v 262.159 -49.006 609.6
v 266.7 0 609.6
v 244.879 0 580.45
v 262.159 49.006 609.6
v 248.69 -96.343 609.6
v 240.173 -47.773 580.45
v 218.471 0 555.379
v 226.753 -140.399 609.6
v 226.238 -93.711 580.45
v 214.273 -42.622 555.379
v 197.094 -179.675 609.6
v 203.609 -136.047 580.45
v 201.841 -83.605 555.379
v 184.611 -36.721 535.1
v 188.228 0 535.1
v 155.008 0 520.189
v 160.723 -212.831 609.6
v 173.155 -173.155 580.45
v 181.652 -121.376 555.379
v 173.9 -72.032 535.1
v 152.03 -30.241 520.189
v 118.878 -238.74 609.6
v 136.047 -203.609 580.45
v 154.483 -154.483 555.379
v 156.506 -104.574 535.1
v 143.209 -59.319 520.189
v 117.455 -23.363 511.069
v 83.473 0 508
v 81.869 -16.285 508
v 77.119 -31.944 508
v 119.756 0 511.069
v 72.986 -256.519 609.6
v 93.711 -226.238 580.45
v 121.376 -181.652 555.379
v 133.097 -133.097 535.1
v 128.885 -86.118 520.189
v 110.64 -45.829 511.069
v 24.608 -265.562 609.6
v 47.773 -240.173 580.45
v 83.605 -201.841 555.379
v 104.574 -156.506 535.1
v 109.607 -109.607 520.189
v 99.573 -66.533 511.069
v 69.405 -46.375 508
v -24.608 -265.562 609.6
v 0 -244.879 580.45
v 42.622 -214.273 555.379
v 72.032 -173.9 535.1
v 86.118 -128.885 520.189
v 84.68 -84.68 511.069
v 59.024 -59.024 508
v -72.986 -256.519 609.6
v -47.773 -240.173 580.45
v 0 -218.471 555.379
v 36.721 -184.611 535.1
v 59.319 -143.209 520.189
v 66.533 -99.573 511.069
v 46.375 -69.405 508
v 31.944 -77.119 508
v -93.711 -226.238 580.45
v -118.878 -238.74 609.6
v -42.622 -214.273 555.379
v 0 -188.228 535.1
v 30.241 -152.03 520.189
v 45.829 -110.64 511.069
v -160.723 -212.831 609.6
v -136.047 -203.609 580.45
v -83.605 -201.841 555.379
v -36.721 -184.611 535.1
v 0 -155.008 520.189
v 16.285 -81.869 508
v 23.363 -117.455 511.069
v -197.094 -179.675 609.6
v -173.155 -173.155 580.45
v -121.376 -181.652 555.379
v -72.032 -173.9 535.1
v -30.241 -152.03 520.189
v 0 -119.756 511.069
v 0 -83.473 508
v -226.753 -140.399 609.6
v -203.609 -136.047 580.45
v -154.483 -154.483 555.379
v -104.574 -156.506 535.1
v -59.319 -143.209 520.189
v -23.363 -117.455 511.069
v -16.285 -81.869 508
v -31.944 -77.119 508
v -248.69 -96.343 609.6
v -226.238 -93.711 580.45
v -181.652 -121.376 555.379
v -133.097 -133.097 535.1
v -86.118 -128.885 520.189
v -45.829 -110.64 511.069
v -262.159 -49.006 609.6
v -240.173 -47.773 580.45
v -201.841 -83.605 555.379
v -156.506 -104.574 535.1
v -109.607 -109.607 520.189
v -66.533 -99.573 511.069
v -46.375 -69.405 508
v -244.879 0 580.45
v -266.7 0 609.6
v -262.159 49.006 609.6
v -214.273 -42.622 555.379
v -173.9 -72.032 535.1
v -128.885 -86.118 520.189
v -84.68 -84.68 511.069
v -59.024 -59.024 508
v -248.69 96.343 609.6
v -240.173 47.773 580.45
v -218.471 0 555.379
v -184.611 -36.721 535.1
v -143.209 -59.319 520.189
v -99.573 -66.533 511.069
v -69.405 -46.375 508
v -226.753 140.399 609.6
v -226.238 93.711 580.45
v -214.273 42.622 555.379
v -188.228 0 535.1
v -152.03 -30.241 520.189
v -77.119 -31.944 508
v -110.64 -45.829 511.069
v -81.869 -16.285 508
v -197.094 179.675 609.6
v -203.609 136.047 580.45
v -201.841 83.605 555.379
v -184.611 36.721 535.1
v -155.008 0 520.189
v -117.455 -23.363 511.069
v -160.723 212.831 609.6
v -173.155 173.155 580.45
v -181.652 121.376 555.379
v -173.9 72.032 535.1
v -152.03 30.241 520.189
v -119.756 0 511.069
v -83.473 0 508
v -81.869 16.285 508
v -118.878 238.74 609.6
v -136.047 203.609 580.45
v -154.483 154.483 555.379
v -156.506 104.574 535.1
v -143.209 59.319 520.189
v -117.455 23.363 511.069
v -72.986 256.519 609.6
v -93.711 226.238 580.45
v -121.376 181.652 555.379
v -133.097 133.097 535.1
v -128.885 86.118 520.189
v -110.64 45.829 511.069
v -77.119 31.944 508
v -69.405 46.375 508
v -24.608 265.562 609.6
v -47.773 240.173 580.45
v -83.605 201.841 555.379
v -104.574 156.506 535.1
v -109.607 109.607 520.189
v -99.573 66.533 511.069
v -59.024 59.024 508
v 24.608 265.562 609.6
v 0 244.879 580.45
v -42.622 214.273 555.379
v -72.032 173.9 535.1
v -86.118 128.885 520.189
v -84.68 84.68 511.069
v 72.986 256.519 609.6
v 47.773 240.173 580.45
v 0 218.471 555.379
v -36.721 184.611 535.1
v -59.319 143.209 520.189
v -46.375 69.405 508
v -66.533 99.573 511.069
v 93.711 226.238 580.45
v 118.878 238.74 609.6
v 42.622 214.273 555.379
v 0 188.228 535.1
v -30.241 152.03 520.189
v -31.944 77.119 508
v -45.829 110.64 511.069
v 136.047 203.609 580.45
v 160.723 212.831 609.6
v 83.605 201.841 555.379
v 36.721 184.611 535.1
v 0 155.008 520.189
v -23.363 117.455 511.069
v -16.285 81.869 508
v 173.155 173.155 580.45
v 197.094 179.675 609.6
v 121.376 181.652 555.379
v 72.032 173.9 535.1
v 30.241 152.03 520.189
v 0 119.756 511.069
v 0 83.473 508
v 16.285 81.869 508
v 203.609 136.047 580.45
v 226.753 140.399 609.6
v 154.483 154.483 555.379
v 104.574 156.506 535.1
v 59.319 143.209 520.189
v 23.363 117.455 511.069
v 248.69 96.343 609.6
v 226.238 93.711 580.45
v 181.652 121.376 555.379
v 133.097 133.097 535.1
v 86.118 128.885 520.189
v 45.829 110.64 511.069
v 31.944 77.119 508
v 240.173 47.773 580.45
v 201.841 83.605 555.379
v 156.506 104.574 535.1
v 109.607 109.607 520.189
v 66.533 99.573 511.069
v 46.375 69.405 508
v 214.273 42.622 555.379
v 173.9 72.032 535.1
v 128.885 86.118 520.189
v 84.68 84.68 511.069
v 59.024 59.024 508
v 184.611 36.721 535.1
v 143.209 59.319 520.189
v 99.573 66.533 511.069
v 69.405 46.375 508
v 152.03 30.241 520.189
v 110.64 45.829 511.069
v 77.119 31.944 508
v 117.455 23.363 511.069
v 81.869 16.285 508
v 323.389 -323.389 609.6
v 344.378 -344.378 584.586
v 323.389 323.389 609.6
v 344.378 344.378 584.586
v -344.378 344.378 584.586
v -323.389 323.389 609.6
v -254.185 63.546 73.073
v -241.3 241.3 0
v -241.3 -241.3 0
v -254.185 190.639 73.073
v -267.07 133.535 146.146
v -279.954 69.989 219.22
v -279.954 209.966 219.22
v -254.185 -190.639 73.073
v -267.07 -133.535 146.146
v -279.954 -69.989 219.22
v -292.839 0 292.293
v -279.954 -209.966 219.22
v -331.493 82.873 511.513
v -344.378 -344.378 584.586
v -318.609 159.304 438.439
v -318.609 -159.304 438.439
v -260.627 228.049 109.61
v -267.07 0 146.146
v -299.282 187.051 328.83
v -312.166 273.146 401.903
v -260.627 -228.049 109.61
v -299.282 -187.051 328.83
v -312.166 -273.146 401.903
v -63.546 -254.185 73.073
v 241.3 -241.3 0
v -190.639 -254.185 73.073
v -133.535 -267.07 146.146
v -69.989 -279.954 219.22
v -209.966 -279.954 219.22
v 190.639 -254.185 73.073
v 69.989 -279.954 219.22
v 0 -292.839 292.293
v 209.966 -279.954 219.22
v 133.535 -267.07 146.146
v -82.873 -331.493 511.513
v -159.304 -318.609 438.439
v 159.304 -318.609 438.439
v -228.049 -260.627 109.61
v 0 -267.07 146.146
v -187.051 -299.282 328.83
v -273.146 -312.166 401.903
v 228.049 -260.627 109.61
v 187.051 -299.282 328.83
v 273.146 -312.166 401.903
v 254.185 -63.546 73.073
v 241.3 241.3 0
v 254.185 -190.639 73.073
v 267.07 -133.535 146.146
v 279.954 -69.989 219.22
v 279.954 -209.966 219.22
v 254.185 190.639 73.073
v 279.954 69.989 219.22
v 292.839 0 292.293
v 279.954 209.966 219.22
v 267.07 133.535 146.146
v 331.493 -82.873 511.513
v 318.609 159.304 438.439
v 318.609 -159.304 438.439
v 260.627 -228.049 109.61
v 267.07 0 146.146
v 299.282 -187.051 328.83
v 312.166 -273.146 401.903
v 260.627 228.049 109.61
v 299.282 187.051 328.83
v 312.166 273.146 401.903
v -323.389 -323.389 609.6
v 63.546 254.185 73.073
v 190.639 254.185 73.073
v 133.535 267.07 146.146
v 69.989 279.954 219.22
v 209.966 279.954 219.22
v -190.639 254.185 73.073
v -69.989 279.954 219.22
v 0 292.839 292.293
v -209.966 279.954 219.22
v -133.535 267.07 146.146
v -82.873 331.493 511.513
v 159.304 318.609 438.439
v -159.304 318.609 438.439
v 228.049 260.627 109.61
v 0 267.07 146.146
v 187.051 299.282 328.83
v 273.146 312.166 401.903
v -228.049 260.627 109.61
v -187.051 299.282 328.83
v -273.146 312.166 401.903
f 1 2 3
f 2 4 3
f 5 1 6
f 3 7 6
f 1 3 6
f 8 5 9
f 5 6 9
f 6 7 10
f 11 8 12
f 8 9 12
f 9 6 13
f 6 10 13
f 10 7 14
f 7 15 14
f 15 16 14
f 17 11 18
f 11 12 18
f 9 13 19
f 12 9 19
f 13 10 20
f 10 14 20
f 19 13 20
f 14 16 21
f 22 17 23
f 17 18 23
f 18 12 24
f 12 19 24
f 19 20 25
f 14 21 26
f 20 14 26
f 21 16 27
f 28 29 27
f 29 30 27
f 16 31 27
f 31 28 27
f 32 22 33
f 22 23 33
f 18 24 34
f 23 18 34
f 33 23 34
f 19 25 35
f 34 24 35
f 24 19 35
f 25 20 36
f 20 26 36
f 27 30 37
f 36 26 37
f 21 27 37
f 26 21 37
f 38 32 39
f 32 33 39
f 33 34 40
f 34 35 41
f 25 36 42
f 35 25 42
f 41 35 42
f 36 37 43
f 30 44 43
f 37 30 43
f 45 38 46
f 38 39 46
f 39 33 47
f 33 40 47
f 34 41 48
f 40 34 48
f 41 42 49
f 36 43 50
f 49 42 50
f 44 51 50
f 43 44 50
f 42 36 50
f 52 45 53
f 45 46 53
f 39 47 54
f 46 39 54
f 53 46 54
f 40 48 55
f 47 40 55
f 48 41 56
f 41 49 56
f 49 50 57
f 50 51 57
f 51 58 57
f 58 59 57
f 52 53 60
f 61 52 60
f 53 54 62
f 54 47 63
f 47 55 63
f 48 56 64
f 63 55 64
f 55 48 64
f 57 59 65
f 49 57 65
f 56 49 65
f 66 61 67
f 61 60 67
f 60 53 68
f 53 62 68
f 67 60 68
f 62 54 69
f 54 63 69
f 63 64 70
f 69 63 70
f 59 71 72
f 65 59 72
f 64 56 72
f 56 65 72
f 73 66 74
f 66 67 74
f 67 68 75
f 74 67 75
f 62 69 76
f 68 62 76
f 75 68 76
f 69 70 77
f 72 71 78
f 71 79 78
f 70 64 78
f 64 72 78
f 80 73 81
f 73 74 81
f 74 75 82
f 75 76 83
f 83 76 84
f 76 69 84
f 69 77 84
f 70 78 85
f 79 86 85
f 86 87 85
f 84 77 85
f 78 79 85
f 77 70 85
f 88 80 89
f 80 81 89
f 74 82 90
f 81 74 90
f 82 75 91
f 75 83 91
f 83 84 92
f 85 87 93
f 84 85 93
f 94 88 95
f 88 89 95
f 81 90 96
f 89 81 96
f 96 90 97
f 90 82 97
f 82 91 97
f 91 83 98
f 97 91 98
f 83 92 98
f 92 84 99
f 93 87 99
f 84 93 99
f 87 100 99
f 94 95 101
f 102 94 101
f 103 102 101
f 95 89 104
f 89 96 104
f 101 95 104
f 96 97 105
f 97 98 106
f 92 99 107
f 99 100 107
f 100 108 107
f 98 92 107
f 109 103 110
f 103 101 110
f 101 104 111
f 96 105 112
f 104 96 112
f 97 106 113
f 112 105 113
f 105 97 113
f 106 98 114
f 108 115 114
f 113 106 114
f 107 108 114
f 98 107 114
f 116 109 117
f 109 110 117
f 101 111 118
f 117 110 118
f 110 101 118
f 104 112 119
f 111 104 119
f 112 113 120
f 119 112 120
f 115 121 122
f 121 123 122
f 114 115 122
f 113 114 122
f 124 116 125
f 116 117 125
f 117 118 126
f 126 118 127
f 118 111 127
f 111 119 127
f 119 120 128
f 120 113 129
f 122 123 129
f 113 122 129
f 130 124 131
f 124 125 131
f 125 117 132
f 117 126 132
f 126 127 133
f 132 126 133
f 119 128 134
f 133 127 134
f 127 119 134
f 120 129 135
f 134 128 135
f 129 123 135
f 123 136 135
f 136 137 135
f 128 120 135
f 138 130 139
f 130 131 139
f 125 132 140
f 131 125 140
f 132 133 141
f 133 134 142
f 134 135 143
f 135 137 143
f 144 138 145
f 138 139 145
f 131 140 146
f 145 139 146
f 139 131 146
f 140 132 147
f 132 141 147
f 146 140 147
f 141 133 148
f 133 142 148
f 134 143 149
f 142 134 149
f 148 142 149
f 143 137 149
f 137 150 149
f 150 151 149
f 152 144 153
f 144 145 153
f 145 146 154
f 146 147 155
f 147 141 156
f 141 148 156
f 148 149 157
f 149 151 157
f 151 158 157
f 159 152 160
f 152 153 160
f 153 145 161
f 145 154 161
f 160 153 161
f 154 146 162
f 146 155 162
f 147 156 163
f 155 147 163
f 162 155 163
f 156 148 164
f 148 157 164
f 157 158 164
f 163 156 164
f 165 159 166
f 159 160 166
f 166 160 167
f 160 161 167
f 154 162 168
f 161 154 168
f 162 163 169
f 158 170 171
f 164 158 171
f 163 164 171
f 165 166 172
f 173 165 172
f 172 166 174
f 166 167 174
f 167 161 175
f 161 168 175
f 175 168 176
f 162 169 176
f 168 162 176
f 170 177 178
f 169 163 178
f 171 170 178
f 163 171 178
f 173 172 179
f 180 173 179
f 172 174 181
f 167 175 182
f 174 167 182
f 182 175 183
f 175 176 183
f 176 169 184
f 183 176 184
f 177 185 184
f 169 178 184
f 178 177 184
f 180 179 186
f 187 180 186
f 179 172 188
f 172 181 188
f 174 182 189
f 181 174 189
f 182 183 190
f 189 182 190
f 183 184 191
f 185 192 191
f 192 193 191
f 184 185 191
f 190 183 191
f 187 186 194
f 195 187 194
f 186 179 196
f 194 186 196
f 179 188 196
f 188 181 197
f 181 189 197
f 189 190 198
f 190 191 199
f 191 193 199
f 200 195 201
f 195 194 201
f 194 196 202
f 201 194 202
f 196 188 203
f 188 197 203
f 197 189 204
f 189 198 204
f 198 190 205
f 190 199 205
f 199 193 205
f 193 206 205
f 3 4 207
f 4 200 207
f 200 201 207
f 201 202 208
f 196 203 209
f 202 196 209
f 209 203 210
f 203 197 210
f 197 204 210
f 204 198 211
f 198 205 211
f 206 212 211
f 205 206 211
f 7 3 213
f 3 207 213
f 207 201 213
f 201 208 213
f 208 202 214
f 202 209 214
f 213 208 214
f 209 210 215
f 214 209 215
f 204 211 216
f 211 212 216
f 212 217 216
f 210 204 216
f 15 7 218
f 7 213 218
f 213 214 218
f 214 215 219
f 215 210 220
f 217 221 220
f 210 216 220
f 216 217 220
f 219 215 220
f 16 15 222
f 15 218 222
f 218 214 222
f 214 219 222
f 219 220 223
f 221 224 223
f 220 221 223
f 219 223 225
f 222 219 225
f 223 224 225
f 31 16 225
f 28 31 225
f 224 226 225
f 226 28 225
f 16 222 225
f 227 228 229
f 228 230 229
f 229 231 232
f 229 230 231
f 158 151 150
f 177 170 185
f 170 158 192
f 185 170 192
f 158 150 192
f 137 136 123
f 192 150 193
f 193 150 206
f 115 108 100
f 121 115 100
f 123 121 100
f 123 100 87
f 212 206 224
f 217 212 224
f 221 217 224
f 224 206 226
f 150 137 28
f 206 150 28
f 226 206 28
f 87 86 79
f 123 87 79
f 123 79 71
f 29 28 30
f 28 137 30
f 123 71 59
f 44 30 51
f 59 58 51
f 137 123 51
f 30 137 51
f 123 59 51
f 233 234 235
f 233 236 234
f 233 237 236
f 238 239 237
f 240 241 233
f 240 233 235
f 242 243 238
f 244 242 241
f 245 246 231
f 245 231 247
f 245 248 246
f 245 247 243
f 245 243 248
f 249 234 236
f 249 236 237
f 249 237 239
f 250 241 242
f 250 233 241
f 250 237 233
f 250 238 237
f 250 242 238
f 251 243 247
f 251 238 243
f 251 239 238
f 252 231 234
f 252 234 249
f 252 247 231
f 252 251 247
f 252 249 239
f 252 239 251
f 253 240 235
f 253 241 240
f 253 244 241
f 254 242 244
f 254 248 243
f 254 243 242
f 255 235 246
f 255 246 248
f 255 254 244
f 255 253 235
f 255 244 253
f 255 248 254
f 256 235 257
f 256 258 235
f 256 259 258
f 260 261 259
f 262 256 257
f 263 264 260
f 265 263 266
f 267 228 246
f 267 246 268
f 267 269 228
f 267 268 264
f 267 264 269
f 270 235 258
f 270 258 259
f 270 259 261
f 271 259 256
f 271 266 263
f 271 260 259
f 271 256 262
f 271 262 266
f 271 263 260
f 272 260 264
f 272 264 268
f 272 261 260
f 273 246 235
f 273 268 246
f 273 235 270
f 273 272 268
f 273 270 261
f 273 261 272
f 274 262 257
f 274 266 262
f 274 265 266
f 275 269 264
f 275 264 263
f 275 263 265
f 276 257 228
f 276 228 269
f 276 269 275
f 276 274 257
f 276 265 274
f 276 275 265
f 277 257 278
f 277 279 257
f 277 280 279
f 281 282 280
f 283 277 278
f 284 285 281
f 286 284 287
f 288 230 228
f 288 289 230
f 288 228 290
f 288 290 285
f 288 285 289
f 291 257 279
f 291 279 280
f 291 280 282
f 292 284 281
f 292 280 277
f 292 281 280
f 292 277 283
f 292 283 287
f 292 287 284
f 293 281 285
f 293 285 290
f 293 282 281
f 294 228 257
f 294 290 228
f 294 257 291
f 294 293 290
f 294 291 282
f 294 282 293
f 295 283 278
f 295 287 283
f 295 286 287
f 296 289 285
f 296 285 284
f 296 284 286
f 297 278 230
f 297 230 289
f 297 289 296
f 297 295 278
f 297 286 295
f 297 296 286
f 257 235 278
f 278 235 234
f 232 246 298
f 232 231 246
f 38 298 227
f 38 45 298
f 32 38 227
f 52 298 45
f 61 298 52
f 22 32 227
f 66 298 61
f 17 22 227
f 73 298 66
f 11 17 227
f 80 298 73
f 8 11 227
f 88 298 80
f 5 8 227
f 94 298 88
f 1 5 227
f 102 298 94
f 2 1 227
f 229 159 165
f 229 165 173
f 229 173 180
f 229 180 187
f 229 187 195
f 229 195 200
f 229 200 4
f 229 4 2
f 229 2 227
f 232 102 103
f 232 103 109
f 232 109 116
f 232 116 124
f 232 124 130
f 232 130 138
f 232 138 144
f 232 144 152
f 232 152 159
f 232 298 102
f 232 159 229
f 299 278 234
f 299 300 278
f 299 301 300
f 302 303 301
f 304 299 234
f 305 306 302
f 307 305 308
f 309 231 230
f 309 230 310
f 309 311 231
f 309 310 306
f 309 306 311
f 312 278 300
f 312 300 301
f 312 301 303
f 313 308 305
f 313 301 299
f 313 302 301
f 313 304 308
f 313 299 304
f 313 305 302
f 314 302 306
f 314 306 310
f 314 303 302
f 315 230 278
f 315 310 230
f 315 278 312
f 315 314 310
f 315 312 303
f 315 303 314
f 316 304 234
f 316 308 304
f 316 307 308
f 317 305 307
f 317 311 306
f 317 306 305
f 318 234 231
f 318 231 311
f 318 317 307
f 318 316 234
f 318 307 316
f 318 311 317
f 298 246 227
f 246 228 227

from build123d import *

# Parameters (mm, degrees)
F0_W     = 482.6
F0_H     = 482.6
F1_DEPTH = 609.6
F1_TAPER = -10
F2_SIZE  = 25.4


with BuildPart() as f1:
    # F0 (on Top) → F1 (new body)
    with BuildSketch(Plane.XY):
        Rectangle(F0_W, F0_H)
    extrude(amount=F1_DEPTH, taper=F1_TAPER)

    # F2
    f2_edges = [f1.edges().sort_by_distance(p)[0] for p in [
        (348.788927, 0, 609.6),
        (0, 348.788927, 609.6),
        (-348.788927, 0, 609.6),
        (0, -348.788927, 609.6),
    ]]
    chamfer(f2_edges, length=F2_SIZE)

    # F7 (on 3pt) → F8 (revolve, cut)
    with BuildSketch(Plane(origin=(0, 0, 0), x_dir=(-1, 0, 0), z_dir=(0, 1, 0))):
        with BuildLine():
            Line((-83.472505641, 508), (0, 508))
            Line((0, 508), (0, 609.6))
            Line((0, 609.6), (-266.7, 609.6))
            ThreePointArc((-266.7, 609.6), (-188.2280242177, 535.0998637348), (-83.472505641, 508))
        make_face()
    revolve(axis=Axis((0, 0, 445.9715634584), (0, 0, -1)), mode=Mode.SUBTRACT)


solid = f1.part
